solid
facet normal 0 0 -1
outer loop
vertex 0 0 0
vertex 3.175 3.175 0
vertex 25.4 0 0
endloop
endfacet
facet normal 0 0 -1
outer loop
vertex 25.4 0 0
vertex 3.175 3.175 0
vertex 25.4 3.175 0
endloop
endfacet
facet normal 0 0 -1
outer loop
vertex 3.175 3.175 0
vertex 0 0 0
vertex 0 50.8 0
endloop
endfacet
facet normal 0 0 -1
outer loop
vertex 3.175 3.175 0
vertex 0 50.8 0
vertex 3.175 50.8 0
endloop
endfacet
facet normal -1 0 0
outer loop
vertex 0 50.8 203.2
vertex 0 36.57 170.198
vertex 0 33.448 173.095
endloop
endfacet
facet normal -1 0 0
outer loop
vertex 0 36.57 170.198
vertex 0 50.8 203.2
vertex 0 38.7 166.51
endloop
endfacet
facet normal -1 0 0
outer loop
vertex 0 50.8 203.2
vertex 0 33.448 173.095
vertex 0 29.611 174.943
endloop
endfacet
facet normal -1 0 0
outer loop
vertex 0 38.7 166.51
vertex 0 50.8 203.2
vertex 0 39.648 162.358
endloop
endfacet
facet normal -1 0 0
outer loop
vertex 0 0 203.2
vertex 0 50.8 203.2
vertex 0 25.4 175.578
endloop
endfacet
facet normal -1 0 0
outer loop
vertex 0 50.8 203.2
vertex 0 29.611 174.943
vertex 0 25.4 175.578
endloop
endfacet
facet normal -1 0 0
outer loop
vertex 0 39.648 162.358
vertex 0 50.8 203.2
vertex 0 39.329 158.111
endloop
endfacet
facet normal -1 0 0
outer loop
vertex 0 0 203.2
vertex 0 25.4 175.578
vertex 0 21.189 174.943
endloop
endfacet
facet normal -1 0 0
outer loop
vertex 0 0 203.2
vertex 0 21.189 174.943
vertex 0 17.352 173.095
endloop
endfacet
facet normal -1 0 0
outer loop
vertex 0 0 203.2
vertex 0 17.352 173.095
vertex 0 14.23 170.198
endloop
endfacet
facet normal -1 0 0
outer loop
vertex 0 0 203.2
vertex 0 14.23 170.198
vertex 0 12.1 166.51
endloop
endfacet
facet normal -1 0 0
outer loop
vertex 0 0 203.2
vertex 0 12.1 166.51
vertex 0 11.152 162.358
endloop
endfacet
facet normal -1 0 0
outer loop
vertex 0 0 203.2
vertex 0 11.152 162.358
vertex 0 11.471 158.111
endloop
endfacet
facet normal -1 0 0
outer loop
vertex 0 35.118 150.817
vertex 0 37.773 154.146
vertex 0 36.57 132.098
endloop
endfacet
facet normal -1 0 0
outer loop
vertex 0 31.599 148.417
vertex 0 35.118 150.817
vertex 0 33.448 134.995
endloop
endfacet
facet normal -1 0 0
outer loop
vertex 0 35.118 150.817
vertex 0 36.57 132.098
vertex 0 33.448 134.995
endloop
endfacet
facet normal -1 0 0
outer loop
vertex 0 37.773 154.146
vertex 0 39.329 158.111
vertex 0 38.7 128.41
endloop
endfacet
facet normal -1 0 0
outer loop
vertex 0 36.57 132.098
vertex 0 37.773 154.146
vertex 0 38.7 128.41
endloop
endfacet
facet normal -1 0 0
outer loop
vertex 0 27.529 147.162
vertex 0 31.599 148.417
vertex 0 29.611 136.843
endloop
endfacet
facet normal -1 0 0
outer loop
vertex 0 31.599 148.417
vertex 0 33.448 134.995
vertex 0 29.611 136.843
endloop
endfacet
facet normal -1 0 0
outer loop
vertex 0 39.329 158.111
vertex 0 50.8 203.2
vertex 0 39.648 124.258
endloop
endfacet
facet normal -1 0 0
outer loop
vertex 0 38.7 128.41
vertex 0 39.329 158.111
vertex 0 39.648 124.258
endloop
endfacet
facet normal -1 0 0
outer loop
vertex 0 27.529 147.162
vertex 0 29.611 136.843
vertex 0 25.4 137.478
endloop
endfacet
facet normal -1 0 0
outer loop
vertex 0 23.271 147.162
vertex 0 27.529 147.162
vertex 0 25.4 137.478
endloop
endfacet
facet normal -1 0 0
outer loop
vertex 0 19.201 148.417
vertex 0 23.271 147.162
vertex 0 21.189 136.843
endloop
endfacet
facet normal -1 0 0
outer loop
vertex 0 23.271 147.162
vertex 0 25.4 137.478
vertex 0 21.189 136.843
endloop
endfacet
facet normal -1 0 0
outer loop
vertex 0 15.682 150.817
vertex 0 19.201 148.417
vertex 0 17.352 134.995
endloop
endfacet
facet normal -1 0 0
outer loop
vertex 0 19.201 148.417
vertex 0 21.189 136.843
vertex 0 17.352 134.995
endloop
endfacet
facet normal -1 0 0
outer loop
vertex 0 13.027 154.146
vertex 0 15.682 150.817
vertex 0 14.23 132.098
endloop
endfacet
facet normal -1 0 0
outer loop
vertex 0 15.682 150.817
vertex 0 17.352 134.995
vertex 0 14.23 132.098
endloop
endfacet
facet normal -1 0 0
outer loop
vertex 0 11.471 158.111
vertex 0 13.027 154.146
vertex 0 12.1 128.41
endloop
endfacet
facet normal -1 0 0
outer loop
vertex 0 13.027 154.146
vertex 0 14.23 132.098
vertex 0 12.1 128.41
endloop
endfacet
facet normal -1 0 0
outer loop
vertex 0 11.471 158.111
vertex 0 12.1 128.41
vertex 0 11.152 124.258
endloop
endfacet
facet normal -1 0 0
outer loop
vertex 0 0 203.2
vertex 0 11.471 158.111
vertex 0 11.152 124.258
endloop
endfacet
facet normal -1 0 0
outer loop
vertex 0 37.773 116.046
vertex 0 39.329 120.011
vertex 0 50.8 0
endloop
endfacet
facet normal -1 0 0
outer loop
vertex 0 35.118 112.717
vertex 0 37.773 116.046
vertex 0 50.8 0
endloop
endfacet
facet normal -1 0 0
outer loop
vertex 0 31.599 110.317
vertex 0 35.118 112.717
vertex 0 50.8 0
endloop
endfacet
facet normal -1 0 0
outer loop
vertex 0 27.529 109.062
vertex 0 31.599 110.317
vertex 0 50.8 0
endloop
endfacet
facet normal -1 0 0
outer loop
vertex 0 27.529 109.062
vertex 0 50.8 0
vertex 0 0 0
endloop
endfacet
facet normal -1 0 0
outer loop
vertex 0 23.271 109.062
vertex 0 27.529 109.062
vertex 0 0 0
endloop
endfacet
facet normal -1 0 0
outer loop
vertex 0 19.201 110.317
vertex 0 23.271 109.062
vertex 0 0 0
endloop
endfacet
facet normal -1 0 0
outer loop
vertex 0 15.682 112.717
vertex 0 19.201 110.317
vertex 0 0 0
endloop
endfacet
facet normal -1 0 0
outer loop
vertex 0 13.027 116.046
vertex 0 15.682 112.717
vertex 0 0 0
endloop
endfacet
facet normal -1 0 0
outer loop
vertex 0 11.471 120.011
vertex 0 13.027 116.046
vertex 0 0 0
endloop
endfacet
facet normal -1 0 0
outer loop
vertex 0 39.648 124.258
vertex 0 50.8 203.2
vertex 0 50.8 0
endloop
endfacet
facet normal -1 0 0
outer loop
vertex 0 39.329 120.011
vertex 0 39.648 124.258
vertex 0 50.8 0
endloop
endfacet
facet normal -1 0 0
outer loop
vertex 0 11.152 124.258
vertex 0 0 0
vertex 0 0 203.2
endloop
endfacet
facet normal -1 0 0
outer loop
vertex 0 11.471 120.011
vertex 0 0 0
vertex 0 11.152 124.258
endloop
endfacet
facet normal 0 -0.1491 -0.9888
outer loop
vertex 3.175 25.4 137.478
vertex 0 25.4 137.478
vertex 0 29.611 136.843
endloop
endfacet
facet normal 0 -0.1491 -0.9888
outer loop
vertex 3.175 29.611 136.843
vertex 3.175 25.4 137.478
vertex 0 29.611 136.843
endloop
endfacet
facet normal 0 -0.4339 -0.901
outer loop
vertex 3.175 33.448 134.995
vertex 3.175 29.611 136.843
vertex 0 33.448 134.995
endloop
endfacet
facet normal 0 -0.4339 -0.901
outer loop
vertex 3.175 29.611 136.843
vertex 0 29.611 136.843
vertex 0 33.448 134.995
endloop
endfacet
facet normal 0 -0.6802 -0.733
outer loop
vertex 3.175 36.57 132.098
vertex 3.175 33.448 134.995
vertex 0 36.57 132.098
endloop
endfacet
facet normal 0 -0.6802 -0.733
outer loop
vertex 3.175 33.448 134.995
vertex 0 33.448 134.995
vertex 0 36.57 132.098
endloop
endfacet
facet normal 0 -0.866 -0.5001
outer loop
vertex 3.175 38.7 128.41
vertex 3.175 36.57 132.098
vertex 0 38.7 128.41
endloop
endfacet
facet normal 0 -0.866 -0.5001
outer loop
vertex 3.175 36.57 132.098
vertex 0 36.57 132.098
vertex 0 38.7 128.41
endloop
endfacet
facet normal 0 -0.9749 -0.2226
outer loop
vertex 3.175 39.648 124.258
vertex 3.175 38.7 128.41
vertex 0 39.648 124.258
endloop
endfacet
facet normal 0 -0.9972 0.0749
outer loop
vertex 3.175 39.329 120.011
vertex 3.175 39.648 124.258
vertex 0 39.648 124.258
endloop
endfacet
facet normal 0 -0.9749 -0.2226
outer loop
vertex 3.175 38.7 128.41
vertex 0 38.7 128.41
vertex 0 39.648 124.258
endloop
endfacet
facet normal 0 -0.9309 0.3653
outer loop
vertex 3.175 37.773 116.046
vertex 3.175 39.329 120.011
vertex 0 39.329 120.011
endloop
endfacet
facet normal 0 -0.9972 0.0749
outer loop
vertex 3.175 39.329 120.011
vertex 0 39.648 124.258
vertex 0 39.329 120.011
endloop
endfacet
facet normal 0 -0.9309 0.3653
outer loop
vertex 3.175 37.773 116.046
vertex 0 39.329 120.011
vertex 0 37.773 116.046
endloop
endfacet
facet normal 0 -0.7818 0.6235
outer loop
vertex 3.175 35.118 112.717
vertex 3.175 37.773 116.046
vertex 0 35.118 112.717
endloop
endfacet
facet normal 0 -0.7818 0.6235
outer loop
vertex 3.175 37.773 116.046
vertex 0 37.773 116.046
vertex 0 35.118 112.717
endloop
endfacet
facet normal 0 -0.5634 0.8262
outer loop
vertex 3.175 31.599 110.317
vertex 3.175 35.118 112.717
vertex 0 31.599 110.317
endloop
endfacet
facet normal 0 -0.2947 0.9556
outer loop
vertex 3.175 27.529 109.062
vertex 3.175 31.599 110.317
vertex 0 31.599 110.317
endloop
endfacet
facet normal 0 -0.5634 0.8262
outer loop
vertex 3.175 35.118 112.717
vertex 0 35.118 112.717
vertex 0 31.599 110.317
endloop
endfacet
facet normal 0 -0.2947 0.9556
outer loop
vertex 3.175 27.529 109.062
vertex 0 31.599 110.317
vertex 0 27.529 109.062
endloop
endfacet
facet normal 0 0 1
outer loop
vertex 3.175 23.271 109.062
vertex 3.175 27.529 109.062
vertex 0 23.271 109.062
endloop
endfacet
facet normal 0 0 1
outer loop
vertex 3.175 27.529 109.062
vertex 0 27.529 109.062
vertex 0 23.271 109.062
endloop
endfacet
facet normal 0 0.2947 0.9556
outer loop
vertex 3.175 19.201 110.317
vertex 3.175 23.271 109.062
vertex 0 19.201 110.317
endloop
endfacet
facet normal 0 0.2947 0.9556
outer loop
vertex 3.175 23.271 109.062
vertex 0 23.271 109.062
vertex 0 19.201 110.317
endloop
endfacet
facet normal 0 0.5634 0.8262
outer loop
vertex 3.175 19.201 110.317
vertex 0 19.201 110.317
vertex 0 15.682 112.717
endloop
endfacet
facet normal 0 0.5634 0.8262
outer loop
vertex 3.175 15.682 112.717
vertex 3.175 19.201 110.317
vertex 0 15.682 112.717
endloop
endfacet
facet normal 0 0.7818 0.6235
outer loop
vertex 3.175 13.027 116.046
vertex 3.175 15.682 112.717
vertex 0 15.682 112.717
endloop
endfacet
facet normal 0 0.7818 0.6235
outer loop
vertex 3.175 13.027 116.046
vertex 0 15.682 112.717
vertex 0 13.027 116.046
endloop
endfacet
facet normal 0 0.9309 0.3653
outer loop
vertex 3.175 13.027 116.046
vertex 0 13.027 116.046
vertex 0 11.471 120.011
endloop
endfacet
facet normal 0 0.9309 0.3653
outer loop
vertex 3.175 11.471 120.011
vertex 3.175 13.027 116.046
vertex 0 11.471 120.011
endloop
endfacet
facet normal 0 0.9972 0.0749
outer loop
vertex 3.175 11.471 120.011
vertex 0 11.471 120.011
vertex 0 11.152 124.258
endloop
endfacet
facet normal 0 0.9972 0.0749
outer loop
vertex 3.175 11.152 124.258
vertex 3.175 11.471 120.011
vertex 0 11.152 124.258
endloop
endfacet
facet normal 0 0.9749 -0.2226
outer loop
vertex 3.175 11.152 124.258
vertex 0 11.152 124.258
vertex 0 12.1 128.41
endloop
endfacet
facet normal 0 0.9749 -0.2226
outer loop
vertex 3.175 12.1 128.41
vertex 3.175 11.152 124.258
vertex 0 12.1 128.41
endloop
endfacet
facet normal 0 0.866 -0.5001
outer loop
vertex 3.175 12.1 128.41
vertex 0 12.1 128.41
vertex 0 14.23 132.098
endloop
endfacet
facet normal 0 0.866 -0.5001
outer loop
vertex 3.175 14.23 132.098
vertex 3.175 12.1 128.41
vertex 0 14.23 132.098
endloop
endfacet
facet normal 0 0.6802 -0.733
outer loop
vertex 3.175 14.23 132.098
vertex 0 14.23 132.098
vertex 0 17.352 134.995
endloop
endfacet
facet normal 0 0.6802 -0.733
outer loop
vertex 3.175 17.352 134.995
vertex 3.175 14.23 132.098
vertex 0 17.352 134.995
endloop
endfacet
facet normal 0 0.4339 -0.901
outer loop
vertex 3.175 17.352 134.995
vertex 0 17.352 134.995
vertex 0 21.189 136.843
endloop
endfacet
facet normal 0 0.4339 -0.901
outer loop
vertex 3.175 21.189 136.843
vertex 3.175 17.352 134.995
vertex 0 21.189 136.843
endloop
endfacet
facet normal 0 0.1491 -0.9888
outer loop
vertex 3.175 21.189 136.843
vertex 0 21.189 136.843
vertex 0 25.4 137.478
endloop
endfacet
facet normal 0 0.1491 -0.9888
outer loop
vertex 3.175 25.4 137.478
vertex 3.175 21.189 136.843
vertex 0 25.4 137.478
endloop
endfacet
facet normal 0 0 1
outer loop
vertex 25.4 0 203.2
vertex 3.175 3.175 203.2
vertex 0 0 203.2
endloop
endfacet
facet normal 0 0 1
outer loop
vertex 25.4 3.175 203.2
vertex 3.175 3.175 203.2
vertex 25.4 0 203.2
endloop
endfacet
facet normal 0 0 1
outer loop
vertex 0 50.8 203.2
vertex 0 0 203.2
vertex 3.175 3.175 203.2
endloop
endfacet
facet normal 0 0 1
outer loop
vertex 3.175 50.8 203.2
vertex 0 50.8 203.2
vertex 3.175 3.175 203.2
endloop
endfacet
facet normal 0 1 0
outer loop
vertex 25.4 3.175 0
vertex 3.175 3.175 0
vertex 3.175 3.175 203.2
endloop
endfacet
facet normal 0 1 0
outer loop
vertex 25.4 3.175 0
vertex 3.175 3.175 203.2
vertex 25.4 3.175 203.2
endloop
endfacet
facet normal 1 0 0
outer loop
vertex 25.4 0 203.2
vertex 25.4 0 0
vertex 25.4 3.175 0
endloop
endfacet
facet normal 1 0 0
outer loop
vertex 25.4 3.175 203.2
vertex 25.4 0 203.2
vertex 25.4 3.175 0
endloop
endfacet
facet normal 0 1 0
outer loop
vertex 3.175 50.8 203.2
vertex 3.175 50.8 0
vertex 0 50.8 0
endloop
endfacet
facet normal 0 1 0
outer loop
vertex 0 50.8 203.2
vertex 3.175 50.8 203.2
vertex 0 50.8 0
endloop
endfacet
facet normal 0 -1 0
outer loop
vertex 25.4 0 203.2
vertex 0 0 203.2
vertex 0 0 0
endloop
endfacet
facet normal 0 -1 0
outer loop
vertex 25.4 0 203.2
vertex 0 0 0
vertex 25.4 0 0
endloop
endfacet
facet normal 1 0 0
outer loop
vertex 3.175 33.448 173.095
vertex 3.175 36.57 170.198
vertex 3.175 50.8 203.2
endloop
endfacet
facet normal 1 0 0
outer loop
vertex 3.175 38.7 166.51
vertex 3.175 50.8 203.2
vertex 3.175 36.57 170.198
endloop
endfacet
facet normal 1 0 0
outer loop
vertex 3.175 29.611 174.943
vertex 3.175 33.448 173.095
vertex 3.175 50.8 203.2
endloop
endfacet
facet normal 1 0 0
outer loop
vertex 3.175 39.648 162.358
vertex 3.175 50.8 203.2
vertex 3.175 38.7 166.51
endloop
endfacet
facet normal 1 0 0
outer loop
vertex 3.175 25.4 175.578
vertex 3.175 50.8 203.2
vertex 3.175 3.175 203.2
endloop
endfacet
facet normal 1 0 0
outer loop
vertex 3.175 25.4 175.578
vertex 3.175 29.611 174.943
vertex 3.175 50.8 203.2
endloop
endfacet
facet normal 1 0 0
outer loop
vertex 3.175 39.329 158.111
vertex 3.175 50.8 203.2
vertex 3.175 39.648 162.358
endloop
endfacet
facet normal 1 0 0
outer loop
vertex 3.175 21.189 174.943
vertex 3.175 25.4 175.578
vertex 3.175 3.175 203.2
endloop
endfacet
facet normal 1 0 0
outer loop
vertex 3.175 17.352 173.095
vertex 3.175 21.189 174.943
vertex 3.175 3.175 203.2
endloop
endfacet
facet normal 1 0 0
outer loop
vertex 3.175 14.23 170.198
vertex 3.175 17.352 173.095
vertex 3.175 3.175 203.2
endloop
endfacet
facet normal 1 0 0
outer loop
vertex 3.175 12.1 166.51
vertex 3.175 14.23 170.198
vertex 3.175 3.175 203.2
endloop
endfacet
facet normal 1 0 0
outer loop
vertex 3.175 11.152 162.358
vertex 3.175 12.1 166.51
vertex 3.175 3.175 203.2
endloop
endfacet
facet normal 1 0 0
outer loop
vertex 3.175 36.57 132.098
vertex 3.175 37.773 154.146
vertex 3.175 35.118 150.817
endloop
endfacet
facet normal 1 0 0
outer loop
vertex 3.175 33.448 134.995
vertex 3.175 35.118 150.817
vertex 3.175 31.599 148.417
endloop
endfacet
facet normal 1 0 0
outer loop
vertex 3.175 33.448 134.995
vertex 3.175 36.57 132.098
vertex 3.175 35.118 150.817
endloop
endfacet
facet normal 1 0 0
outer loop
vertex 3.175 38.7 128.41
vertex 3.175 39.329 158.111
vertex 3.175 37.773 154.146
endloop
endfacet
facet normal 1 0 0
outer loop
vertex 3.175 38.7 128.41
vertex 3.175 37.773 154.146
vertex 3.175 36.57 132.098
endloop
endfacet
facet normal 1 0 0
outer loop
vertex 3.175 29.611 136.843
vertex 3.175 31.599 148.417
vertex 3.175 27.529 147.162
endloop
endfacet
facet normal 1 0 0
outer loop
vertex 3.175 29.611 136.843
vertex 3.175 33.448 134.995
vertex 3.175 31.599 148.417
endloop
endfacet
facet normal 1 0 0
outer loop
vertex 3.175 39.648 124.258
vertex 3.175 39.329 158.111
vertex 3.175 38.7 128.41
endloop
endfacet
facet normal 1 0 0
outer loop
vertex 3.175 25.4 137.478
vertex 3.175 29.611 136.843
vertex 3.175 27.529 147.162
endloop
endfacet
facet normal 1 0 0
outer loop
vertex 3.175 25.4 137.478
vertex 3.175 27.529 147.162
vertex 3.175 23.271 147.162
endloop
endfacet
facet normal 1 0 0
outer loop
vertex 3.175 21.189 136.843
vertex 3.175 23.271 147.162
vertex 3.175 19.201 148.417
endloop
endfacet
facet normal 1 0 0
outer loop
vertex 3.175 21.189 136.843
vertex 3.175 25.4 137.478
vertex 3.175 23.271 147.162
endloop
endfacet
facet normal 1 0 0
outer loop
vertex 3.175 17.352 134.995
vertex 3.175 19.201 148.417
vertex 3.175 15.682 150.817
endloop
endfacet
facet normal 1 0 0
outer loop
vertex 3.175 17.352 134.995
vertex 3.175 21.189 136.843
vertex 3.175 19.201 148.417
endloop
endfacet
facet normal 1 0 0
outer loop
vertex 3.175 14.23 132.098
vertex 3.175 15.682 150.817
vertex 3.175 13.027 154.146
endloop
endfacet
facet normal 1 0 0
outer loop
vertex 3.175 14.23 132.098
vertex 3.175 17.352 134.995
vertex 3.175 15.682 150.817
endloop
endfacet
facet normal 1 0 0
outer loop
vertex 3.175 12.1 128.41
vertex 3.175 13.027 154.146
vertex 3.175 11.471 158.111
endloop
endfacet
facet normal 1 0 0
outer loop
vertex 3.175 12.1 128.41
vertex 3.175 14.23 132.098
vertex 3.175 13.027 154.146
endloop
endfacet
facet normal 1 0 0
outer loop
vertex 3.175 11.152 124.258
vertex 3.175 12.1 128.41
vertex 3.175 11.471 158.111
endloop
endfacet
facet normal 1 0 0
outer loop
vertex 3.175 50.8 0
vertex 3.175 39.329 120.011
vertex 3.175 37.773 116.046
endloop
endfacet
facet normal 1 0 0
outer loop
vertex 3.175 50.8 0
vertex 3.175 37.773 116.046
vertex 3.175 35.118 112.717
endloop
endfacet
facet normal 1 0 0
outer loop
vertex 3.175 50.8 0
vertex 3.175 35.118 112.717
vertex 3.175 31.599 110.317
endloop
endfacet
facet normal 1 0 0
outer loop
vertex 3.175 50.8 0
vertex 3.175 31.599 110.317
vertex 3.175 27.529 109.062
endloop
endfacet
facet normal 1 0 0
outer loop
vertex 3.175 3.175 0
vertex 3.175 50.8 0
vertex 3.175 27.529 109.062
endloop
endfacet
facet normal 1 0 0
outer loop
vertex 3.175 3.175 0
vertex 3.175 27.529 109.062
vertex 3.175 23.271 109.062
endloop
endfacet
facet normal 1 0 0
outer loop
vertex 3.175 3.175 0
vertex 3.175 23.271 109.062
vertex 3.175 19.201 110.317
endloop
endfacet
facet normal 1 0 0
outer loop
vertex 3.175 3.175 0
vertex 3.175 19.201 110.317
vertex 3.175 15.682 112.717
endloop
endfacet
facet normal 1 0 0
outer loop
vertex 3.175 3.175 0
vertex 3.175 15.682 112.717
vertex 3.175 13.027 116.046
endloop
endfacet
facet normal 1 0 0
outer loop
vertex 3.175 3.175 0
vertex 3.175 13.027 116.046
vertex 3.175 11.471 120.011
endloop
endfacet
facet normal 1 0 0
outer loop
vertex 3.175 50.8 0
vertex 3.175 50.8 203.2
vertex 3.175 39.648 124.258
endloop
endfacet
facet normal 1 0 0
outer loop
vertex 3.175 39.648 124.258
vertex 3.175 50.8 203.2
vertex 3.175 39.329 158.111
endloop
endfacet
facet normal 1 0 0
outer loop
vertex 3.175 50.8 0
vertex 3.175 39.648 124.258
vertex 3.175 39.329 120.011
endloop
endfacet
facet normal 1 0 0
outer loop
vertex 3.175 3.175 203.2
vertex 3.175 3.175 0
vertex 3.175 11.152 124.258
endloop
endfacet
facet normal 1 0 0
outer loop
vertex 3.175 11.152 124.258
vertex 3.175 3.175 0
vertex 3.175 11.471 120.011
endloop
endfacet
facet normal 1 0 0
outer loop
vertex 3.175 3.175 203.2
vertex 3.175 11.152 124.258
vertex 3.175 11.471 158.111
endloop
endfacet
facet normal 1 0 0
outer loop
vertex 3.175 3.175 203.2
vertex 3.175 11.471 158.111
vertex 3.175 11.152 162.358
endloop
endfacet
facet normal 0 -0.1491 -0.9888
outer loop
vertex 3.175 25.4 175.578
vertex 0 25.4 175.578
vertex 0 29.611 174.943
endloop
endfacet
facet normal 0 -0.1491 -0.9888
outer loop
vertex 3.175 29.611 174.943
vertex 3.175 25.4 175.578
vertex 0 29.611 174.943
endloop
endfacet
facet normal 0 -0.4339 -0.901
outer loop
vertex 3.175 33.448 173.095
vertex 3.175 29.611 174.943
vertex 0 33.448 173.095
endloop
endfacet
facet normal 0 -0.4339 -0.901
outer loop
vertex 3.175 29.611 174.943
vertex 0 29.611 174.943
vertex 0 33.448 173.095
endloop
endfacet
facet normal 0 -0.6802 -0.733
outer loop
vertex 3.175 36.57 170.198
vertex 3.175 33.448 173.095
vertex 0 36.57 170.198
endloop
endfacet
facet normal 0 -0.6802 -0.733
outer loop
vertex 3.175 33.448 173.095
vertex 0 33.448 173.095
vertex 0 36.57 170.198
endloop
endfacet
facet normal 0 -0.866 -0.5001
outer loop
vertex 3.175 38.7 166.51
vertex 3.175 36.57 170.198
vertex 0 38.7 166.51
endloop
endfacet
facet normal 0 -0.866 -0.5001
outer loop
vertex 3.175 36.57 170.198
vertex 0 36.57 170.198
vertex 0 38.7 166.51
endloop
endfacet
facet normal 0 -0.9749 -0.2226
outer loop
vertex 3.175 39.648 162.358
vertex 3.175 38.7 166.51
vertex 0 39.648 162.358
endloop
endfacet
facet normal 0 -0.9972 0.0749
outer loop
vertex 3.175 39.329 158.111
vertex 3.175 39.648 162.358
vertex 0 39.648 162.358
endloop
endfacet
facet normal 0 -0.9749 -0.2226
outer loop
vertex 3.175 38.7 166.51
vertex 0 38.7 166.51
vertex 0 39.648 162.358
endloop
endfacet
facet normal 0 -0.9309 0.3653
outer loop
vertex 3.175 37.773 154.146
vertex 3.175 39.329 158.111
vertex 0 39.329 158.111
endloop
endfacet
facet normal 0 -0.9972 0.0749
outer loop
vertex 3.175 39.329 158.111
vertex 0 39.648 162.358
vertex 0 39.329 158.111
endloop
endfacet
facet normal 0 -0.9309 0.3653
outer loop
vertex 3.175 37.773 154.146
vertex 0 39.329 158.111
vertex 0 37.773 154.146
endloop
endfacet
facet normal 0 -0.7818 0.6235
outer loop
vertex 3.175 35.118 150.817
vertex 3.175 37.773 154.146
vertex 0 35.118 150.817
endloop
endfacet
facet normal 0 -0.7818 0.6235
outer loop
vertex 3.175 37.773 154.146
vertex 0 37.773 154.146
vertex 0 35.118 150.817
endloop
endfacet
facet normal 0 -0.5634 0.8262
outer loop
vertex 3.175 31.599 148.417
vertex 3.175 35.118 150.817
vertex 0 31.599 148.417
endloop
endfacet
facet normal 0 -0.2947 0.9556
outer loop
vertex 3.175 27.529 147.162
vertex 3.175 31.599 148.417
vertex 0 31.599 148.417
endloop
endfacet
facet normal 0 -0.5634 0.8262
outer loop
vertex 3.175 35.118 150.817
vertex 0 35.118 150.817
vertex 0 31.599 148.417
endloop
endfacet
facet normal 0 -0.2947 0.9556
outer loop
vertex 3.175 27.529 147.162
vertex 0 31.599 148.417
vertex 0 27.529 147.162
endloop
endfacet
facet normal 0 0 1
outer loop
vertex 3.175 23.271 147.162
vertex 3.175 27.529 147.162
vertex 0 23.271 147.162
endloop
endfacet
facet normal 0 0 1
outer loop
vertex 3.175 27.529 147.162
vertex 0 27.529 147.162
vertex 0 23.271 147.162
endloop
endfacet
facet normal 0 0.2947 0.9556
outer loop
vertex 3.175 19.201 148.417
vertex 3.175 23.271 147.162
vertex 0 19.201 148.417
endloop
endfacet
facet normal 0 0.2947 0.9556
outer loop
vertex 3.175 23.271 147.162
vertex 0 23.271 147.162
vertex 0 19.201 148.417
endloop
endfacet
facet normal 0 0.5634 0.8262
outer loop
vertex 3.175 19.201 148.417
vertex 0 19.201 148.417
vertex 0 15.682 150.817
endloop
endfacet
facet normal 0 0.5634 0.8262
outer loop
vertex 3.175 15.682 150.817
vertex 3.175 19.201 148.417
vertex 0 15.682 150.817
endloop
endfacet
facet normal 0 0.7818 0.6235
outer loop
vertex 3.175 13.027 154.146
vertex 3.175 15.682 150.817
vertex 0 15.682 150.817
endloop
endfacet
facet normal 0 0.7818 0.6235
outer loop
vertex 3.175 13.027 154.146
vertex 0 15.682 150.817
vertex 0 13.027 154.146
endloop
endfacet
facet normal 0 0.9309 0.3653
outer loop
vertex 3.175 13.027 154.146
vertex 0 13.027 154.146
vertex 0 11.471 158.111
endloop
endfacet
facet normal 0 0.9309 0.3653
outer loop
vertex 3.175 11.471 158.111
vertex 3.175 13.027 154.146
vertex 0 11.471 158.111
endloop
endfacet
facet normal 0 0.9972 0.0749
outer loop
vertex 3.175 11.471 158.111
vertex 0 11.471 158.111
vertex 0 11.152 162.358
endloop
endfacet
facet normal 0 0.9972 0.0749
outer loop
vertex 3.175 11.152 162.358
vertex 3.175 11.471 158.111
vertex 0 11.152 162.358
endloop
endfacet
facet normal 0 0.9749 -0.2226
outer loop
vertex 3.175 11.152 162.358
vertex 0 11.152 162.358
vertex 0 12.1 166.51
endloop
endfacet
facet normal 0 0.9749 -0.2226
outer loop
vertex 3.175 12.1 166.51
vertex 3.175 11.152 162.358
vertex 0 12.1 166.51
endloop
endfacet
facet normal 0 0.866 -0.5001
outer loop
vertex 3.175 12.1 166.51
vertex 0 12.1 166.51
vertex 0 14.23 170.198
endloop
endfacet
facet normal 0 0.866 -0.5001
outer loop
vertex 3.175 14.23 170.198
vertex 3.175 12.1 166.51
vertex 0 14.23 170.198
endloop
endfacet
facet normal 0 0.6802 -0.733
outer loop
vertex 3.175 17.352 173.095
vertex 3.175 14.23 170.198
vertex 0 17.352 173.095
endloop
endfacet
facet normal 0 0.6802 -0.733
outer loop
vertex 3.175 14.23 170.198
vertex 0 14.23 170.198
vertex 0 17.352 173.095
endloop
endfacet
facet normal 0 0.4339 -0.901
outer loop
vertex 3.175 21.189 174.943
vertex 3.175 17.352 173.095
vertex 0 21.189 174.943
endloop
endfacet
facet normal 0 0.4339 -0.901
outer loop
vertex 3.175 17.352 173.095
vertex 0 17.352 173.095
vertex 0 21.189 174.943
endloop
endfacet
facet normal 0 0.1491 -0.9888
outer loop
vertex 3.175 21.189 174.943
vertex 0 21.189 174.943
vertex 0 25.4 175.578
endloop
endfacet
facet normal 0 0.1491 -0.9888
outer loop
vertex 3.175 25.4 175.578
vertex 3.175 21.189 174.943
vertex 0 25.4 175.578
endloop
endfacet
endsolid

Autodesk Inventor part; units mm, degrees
ref_plane "YZ Plane" through (0, 0, 0) normal (1, 0, 0) x (0, 1, 0)
ref_plane "XZ Plane" through (0, 0, 0) normal (0, 1, 0) x (-1, 0, 0)
ref_plane "XY Plane" through (0, 0, 0) normal (0, 0, 1) x (1, 0, 0)
sketch "Sketch1" plane through (0, 0, 0) normal (0, 0, 1) x (1, 0, 0)
  line L0 (0, 0) -> (25.4, 0)
  line L1 (25.4, 0) -> (25.4, 3.175)
  line L2 (3.175, 50.8) -> (0, 50.8)
  line L3 (0, 50.8) -> (0, 0)
  line L4 (3.175, 50.8) -> (3.175, 3.175)
  line L5 (3.175, 3.175) -> (25.4, 3.175)
  dimension "d0" = 50.8
  dimension "d1" = 25.4
  dimension "d2" = 3.175
  dimension "d3" = 3.175
extrude "Extrusion1" add sketch "Sketch1" along normal blind 203.2
sketch "Sketch2" plane through (0, 0, 0) normal (-1, 0, 0) x (0, 0, 1)
  line L0 (203.2, 0) -> (203.2, 50.8) projected
  line L1 (0, 50.8) -> (203.2, 50.8) projected
  circle A0 centre (123.19, 25.4) radius 14.2875
  circle A1 centre (161.29, 25.4) radius 14.2875
  dimension "d6" = 28.575
  dimension "d7" = 28.575
  dimension "d8" = 25.4
  dimension "d9" = 41.91
  dimension "d10" = 38.1
extrude "Extrusion2" cut sketch "Sketch2" against normal blind 203.2
equation "\"d6\" = d7"
properties part number "manipulator bearing back right"
